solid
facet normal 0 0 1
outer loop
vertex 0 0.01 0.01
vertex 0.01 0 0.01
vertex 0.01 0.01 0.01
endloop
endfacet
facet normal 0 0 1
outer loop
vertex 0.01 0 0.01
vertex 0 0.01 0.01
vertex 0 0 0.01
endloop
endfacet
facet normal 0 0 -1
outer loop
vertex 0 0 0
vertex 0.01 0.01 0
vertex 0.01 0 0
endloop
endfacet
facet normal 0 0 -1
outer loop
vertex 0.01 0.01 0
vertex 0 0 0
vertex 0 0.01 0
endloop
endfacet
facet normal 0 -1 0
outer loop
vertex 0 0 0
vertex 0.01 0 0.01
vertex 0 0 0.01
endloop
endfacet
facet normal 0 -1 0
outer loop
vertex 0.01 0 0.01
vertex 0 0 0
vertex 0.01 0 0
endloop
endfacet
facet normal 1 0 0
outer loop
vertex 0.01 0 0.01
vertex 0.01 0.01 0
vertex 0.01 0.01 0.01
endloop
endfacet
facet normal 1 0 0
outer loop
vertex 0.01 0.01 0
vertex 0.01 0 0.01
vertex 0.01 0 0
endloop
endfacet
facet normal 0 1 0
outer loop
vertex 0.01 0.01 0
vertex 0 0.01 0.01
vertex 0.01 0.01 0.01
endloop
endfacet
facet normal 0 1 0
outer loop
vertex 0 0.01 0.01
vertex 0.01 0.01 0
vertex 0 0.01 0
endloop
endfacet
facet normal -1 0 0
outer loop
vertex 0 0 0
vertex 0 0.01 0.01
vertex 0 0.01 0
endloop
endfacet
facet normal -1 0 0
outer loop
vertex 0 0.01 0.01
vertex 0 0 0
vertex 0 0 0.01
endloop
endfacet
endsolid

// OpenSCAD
// @regression: deliberate
/***
 * @function superformula_accessibility_cases
 * @brief Focused accessibility checks: shallow concavity remains usable, while a
 * Source: [`superformula/accessibility_cases.scad`](superformula/accessibility_cases.scad)
 *
 * deep U-shaped contour deliberately omits blocked source positions.
 */
include <../../src/superformula/gear.scad>

function accessibility_results(points,modul,tooth_number,candidate) =
    let(
        arc=_cg_polyline_arc_table(points),
        perimeter=arc[len(arc)-1][1],
        body=_cg_canonical_body_polyline(points,_cg_dedendum(modul),false)
    )
    [for(i=[0:tooth_number-1])
        let(target=perimeter*(i+.25)/tooth_number,
            result=_cg_accessibility_result(points,arc,perimeter,body,target,perimeter/tooth_number,modul,candidate,false))
        result];

function accessibility_indices(results) = [for(i=[0:len(results)-1]) if(results[i][0]) i];

shallow_modul=.8;
shallow_teeth=34;
shallow_samples=360;
shallow_scale=_cg_superformula_scale(shallow_modul,shallow_teeth,5,1,1,2.4,3.4,3.4,shallow_samples);
shallow_points=_cg_superformula_points(shallow_scale,5,1,1,2.4,3.4,3.4,shallow_samples);
shallow_candidate=_cg_reference_tooth_candidate(shallow_modul*shallow_teeth/2,shallow_modul,shallow_teeth,20);
shallow_results=accessibility_results(shallow_points,shallow_modul,shallow_teeth,shallow_candidate);
shallow_blocked=accessibility_indices(shallow_results);
assert(len(shallow_blocked)==0,str("expected shallow superformula to remain accessible, blocked=",shallow_blocked));
echo("stage=accessibility severity=info code=SHALLOW_ACCESSIBLE PASS blocked=0");

deep_modul=.8;
deep_teeth=24;
deep_samples=360;
deep_scale=_cg_superformula_scale(deep_modul,deep_teeth,5,1,1,.3,3.4,3.4,deep_samples);
deep_points=_cg_superformula_points(deep_scale,5,1,1,.3,3.4,3.4,deep_samples);
deep_candidate=_cg_reference_tooth_candidate(deep_modul*deep_teeth/2,deep_modul,deep_teeth,20);
deep_results=accessibility_results(deep_points,deep_modul,deep_teeth,deep_candidate);
deep_blocked=accessibility_indices(deep_results);
deep_accessible=[for(i=[0:deep_teeth-1]) if(!deep_results[i][0]) i];
deep_remote=[for(result=deep_results) if(result[1]>=0) result];
assert(len(deep_blocked)>0,str("expected deep U-shaped superformula to omit positions, blocked=",deep_blocked));
assert(len(deep_accessible)>0,str("expected neighbouring deep positions to remain accessible, blocked=",deep_blocked));
assert(len(deep_remote)>0,"expected at least one remote-body corridor obstruction");
echo(str("stage=accessibility severity=info code=DEEP_U_OMITTED PASS blocked=",deep_blocked));
echo(str("stage=accessibility severity=info code=DEEP_U_MIXED PASS accessible=",deep_accessible));
echo(str("stage=accessibility severity=info code=REMOTE_CORRIDOR_OBSTRUCTION PASS segment=",deep_remote[0][1]," point=",deep_remote[0][2]));

cube([0.01,0.01,0.01]);
